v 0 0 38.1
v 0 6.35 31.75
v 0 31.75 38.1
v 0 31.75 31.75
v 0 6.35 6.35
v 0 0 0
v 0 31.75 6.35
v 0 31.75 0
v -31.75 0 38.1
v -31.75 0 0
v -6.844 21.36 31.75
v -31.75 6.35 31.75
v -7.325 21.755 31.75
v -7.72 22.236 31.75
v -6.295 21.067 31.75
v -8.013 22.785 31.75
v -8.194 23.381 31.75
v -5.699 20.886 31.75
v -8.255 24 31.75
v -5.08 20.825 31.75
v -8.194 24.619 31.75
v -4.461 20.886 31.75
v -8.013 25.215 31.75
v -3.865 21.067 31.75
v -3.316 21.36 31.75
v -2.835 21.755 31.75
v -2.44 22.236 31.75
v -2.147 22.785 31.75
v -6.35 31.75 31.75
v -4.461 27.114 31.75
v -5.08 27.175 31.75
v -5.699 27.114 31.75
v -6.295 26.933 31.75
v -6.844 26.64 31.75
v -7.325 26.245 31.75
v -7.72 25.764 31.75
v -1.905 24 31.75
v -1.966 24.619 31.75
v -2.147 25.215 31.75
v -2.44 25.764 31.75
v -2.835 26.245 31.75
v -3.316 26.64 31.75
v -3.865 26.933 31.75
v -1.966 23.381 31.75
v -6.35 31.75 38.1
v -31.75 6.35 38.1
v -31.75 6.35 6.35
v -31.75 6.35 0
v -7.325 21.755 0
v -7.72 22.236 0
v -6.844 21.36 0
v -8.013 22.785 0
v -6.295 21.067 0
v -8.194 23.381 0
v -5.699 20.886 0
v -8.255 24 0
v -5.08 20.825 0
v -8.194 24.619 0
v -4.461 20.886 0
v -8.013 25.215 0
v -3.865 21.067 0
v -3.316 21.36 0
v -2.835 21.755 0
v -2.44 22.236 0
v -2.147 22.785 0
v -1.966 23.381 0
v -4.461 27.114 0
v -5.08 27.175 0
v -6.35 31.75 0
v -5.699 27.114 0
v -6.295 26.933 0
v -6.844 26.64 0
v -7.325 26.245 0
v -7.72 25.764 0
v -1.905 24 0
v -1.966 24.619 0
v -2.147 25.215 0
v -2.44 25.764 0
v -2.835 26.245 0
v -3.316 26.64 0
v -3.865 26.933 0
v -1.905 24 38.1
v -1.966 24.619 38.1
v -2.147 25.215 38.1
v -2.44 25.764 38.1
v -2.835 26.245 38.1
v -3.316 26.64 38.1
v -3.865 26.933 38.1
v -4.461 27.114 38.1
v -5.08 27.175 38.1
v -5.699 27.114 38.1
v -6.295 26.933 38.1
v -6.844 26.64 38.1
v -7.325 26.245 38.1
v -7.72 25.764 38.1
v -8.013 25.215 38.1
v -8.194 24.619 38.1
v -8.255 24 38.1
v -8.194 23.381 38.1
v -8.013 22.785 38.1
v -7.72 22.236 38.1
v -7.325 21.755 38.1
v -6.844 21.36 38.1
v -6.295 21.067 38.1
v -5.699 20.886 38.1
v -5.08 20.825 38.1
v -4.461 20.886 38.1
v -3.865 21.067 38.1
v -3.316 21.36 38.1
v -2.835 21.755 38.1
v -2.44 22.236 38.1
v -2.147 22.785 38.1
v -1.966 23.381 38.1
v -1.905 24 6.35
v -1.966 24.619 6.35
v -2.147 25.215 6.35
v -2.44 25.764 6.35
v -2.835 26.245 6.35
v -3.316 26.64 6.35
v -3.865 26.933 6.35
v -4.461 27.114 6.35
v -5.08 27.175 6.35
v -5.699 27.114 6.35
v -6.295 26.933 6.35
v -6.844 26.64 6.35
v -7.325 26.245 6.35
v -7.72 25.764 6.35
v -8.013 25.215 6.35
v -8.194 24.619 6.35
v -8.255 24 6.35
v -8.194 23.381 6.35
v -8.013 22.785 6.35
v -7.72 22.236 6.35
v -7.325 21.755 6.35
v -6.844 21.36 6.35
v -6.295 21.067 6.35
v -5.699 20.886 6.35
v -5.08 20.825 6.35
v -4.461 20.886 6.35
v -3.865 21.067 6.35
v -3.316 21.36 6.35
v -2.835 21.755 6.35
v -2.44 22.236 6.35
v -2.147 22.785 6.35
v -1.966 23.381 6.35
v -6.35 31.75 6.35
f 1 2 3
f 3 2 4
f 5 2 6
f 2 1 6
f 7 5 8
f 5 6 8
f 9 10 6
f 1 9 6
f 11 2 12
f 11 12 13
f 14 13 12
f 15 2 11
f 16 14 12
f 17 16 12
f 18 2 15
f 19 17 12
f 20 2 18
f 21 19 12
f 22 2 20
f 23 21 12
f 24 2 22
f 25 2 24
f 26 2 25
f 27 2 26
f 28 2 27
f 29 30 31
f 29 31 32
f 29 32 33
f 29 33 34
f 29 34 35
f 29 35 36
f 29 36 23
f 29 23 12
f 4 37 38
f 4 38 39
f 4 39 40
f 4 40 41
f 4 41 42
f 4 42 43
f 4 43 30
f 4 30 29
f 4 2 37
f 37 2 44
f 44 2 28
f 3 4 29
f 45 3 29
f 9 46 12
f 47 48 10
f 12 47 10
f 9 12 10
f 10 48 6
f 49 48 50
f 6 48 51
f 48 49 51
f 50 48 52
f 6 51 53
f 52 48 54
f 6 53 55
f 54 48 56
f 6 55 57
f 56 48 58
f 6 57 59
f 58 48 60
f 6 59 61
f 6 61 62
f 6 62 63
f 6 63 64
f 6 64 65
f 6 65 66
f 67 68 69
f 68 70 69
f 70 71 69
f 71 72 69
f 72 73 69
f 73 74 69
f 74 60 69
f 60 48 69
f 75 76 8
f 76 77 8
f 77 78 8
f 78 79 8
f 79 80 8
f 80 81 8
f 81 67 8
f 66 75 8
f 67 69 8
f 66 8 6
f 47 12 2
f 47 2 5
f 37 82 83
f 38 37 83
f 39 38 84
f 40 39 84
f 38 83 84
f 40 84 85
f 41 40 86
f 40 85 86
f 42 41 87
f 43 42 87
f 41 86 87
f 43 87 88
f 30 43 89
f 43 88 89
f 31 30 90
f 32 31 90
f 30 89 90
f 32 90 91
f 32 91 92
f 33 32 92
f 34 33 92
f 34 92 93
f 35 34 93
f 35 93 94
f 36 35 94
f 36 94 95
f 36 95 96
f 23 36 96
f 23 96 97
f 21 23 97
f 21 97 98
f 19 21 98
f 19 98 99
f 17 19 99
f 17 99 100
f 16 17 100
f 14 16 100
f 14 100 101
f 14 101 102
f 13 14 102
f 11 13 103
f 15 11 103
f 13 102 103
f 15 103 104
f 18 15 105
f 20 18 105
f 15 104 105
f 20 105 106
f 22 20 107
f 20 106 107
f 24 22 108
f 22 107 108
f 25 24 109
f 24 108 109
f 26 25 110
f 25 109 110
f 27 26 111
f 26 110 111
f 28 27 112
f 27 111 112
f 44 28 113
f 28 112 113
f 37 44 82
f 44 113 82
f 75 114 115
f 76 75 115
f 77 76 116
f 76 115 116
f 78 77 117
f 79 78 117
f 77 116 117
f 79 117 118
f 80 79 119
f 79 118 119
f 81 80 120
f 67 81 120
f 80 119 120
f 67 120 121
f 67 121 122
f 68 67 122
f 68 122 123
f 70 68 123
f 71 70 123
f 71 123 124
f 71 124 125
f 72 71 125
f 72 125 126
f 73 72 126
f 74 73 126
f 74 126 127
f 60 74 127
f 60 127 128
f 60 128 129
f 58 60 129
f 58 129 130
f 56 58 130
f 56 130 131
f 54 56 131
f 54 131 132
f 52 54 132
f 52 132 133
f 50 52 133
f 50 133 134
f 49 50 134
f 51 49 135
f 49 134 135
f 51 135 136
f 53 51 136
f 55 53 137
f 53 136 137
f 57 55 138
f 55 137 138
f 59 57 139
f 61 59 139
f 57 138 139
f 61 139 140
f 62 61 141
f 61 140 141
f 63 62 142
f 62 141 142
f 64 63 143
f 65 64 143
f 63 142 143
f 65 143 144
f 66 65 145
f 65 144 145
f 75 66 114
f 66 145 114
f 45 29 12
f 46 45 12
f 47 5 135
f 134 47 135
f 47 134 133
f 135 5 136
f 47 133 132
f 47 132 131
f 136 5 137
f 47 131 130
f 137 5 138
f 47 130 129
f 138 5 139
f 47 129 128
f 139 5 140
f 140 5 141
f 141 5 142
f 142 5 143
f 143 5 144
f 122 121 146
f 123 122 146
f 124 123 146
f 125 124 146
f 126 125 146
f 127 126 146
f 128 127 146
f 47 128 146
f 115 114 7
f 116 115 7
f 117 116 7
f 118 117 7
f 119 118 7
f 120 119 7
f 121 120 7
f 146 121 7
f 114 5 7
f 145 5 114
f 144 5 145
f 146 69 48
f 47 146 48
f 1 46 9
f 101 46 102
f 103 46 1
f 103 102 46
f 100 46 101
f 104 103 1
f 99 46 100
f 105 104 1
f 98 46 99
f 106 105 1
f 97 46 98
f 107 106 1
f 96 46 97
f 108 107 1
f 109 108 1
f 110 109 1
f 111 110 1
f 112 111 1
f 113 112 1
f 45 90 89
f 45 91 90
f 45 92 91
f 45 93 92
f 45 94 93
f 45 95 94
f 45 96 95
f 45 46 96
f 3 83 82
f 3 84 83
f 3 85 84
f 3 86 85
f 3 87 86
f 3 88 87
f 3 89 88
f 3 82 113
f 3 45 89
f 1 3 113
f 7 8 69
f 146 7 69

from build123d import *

# Parameters (mm, degrees)
BOSS_EXTRUDE1_DEPTH = 38.1
SKETCH2_W           = 25.4
SKETCH2_H           = 25.4
CUT_EXTRUDE1_DEPTH  = 38.1
SKETCH3_R           = 3.175
CUT_EXTRUDE2_DEPTH  = 38.1


with BuildPart() as part:
    # Sketch1 → Boss-Extrude1 (new body)
    with BuildSketch(Plane.XY):
        Polygon((-31.75, 0), (0, 0), (0, 31.75), (-6.35, 31.75), (-31.75, 6.35), align=None)
    extrude(amount=BOSS_EXTRUDE1_DEPTH)

    # Sketch2 → Cut-Extrude1 (cut)
    with BuildSketch(Plane(origin=(0, 0, 0), x_dir=(0, 0, -1), z_dir=(1, 0, 0))):
        with Locations((-19.05, 19.05)):
            Rectangle(SKETCH2_W, SKETCH2_H)
    extrude(amount=-CUT_EXTRUDE1_DEPTH, mode=Mode.SUBTRACT)

    # Sketch3 → Cut-Extrude2 (cut)
    with BuildSketch(Plane.XY.offset(38.1)):
        with Locations((-5.08, 24)):
            Circle(SKETCH3_R)
    extrude(amount=-CUT_EXTRUDE2_DEPTH, mode=Mode.SUBTRACT)


solid = part.part
